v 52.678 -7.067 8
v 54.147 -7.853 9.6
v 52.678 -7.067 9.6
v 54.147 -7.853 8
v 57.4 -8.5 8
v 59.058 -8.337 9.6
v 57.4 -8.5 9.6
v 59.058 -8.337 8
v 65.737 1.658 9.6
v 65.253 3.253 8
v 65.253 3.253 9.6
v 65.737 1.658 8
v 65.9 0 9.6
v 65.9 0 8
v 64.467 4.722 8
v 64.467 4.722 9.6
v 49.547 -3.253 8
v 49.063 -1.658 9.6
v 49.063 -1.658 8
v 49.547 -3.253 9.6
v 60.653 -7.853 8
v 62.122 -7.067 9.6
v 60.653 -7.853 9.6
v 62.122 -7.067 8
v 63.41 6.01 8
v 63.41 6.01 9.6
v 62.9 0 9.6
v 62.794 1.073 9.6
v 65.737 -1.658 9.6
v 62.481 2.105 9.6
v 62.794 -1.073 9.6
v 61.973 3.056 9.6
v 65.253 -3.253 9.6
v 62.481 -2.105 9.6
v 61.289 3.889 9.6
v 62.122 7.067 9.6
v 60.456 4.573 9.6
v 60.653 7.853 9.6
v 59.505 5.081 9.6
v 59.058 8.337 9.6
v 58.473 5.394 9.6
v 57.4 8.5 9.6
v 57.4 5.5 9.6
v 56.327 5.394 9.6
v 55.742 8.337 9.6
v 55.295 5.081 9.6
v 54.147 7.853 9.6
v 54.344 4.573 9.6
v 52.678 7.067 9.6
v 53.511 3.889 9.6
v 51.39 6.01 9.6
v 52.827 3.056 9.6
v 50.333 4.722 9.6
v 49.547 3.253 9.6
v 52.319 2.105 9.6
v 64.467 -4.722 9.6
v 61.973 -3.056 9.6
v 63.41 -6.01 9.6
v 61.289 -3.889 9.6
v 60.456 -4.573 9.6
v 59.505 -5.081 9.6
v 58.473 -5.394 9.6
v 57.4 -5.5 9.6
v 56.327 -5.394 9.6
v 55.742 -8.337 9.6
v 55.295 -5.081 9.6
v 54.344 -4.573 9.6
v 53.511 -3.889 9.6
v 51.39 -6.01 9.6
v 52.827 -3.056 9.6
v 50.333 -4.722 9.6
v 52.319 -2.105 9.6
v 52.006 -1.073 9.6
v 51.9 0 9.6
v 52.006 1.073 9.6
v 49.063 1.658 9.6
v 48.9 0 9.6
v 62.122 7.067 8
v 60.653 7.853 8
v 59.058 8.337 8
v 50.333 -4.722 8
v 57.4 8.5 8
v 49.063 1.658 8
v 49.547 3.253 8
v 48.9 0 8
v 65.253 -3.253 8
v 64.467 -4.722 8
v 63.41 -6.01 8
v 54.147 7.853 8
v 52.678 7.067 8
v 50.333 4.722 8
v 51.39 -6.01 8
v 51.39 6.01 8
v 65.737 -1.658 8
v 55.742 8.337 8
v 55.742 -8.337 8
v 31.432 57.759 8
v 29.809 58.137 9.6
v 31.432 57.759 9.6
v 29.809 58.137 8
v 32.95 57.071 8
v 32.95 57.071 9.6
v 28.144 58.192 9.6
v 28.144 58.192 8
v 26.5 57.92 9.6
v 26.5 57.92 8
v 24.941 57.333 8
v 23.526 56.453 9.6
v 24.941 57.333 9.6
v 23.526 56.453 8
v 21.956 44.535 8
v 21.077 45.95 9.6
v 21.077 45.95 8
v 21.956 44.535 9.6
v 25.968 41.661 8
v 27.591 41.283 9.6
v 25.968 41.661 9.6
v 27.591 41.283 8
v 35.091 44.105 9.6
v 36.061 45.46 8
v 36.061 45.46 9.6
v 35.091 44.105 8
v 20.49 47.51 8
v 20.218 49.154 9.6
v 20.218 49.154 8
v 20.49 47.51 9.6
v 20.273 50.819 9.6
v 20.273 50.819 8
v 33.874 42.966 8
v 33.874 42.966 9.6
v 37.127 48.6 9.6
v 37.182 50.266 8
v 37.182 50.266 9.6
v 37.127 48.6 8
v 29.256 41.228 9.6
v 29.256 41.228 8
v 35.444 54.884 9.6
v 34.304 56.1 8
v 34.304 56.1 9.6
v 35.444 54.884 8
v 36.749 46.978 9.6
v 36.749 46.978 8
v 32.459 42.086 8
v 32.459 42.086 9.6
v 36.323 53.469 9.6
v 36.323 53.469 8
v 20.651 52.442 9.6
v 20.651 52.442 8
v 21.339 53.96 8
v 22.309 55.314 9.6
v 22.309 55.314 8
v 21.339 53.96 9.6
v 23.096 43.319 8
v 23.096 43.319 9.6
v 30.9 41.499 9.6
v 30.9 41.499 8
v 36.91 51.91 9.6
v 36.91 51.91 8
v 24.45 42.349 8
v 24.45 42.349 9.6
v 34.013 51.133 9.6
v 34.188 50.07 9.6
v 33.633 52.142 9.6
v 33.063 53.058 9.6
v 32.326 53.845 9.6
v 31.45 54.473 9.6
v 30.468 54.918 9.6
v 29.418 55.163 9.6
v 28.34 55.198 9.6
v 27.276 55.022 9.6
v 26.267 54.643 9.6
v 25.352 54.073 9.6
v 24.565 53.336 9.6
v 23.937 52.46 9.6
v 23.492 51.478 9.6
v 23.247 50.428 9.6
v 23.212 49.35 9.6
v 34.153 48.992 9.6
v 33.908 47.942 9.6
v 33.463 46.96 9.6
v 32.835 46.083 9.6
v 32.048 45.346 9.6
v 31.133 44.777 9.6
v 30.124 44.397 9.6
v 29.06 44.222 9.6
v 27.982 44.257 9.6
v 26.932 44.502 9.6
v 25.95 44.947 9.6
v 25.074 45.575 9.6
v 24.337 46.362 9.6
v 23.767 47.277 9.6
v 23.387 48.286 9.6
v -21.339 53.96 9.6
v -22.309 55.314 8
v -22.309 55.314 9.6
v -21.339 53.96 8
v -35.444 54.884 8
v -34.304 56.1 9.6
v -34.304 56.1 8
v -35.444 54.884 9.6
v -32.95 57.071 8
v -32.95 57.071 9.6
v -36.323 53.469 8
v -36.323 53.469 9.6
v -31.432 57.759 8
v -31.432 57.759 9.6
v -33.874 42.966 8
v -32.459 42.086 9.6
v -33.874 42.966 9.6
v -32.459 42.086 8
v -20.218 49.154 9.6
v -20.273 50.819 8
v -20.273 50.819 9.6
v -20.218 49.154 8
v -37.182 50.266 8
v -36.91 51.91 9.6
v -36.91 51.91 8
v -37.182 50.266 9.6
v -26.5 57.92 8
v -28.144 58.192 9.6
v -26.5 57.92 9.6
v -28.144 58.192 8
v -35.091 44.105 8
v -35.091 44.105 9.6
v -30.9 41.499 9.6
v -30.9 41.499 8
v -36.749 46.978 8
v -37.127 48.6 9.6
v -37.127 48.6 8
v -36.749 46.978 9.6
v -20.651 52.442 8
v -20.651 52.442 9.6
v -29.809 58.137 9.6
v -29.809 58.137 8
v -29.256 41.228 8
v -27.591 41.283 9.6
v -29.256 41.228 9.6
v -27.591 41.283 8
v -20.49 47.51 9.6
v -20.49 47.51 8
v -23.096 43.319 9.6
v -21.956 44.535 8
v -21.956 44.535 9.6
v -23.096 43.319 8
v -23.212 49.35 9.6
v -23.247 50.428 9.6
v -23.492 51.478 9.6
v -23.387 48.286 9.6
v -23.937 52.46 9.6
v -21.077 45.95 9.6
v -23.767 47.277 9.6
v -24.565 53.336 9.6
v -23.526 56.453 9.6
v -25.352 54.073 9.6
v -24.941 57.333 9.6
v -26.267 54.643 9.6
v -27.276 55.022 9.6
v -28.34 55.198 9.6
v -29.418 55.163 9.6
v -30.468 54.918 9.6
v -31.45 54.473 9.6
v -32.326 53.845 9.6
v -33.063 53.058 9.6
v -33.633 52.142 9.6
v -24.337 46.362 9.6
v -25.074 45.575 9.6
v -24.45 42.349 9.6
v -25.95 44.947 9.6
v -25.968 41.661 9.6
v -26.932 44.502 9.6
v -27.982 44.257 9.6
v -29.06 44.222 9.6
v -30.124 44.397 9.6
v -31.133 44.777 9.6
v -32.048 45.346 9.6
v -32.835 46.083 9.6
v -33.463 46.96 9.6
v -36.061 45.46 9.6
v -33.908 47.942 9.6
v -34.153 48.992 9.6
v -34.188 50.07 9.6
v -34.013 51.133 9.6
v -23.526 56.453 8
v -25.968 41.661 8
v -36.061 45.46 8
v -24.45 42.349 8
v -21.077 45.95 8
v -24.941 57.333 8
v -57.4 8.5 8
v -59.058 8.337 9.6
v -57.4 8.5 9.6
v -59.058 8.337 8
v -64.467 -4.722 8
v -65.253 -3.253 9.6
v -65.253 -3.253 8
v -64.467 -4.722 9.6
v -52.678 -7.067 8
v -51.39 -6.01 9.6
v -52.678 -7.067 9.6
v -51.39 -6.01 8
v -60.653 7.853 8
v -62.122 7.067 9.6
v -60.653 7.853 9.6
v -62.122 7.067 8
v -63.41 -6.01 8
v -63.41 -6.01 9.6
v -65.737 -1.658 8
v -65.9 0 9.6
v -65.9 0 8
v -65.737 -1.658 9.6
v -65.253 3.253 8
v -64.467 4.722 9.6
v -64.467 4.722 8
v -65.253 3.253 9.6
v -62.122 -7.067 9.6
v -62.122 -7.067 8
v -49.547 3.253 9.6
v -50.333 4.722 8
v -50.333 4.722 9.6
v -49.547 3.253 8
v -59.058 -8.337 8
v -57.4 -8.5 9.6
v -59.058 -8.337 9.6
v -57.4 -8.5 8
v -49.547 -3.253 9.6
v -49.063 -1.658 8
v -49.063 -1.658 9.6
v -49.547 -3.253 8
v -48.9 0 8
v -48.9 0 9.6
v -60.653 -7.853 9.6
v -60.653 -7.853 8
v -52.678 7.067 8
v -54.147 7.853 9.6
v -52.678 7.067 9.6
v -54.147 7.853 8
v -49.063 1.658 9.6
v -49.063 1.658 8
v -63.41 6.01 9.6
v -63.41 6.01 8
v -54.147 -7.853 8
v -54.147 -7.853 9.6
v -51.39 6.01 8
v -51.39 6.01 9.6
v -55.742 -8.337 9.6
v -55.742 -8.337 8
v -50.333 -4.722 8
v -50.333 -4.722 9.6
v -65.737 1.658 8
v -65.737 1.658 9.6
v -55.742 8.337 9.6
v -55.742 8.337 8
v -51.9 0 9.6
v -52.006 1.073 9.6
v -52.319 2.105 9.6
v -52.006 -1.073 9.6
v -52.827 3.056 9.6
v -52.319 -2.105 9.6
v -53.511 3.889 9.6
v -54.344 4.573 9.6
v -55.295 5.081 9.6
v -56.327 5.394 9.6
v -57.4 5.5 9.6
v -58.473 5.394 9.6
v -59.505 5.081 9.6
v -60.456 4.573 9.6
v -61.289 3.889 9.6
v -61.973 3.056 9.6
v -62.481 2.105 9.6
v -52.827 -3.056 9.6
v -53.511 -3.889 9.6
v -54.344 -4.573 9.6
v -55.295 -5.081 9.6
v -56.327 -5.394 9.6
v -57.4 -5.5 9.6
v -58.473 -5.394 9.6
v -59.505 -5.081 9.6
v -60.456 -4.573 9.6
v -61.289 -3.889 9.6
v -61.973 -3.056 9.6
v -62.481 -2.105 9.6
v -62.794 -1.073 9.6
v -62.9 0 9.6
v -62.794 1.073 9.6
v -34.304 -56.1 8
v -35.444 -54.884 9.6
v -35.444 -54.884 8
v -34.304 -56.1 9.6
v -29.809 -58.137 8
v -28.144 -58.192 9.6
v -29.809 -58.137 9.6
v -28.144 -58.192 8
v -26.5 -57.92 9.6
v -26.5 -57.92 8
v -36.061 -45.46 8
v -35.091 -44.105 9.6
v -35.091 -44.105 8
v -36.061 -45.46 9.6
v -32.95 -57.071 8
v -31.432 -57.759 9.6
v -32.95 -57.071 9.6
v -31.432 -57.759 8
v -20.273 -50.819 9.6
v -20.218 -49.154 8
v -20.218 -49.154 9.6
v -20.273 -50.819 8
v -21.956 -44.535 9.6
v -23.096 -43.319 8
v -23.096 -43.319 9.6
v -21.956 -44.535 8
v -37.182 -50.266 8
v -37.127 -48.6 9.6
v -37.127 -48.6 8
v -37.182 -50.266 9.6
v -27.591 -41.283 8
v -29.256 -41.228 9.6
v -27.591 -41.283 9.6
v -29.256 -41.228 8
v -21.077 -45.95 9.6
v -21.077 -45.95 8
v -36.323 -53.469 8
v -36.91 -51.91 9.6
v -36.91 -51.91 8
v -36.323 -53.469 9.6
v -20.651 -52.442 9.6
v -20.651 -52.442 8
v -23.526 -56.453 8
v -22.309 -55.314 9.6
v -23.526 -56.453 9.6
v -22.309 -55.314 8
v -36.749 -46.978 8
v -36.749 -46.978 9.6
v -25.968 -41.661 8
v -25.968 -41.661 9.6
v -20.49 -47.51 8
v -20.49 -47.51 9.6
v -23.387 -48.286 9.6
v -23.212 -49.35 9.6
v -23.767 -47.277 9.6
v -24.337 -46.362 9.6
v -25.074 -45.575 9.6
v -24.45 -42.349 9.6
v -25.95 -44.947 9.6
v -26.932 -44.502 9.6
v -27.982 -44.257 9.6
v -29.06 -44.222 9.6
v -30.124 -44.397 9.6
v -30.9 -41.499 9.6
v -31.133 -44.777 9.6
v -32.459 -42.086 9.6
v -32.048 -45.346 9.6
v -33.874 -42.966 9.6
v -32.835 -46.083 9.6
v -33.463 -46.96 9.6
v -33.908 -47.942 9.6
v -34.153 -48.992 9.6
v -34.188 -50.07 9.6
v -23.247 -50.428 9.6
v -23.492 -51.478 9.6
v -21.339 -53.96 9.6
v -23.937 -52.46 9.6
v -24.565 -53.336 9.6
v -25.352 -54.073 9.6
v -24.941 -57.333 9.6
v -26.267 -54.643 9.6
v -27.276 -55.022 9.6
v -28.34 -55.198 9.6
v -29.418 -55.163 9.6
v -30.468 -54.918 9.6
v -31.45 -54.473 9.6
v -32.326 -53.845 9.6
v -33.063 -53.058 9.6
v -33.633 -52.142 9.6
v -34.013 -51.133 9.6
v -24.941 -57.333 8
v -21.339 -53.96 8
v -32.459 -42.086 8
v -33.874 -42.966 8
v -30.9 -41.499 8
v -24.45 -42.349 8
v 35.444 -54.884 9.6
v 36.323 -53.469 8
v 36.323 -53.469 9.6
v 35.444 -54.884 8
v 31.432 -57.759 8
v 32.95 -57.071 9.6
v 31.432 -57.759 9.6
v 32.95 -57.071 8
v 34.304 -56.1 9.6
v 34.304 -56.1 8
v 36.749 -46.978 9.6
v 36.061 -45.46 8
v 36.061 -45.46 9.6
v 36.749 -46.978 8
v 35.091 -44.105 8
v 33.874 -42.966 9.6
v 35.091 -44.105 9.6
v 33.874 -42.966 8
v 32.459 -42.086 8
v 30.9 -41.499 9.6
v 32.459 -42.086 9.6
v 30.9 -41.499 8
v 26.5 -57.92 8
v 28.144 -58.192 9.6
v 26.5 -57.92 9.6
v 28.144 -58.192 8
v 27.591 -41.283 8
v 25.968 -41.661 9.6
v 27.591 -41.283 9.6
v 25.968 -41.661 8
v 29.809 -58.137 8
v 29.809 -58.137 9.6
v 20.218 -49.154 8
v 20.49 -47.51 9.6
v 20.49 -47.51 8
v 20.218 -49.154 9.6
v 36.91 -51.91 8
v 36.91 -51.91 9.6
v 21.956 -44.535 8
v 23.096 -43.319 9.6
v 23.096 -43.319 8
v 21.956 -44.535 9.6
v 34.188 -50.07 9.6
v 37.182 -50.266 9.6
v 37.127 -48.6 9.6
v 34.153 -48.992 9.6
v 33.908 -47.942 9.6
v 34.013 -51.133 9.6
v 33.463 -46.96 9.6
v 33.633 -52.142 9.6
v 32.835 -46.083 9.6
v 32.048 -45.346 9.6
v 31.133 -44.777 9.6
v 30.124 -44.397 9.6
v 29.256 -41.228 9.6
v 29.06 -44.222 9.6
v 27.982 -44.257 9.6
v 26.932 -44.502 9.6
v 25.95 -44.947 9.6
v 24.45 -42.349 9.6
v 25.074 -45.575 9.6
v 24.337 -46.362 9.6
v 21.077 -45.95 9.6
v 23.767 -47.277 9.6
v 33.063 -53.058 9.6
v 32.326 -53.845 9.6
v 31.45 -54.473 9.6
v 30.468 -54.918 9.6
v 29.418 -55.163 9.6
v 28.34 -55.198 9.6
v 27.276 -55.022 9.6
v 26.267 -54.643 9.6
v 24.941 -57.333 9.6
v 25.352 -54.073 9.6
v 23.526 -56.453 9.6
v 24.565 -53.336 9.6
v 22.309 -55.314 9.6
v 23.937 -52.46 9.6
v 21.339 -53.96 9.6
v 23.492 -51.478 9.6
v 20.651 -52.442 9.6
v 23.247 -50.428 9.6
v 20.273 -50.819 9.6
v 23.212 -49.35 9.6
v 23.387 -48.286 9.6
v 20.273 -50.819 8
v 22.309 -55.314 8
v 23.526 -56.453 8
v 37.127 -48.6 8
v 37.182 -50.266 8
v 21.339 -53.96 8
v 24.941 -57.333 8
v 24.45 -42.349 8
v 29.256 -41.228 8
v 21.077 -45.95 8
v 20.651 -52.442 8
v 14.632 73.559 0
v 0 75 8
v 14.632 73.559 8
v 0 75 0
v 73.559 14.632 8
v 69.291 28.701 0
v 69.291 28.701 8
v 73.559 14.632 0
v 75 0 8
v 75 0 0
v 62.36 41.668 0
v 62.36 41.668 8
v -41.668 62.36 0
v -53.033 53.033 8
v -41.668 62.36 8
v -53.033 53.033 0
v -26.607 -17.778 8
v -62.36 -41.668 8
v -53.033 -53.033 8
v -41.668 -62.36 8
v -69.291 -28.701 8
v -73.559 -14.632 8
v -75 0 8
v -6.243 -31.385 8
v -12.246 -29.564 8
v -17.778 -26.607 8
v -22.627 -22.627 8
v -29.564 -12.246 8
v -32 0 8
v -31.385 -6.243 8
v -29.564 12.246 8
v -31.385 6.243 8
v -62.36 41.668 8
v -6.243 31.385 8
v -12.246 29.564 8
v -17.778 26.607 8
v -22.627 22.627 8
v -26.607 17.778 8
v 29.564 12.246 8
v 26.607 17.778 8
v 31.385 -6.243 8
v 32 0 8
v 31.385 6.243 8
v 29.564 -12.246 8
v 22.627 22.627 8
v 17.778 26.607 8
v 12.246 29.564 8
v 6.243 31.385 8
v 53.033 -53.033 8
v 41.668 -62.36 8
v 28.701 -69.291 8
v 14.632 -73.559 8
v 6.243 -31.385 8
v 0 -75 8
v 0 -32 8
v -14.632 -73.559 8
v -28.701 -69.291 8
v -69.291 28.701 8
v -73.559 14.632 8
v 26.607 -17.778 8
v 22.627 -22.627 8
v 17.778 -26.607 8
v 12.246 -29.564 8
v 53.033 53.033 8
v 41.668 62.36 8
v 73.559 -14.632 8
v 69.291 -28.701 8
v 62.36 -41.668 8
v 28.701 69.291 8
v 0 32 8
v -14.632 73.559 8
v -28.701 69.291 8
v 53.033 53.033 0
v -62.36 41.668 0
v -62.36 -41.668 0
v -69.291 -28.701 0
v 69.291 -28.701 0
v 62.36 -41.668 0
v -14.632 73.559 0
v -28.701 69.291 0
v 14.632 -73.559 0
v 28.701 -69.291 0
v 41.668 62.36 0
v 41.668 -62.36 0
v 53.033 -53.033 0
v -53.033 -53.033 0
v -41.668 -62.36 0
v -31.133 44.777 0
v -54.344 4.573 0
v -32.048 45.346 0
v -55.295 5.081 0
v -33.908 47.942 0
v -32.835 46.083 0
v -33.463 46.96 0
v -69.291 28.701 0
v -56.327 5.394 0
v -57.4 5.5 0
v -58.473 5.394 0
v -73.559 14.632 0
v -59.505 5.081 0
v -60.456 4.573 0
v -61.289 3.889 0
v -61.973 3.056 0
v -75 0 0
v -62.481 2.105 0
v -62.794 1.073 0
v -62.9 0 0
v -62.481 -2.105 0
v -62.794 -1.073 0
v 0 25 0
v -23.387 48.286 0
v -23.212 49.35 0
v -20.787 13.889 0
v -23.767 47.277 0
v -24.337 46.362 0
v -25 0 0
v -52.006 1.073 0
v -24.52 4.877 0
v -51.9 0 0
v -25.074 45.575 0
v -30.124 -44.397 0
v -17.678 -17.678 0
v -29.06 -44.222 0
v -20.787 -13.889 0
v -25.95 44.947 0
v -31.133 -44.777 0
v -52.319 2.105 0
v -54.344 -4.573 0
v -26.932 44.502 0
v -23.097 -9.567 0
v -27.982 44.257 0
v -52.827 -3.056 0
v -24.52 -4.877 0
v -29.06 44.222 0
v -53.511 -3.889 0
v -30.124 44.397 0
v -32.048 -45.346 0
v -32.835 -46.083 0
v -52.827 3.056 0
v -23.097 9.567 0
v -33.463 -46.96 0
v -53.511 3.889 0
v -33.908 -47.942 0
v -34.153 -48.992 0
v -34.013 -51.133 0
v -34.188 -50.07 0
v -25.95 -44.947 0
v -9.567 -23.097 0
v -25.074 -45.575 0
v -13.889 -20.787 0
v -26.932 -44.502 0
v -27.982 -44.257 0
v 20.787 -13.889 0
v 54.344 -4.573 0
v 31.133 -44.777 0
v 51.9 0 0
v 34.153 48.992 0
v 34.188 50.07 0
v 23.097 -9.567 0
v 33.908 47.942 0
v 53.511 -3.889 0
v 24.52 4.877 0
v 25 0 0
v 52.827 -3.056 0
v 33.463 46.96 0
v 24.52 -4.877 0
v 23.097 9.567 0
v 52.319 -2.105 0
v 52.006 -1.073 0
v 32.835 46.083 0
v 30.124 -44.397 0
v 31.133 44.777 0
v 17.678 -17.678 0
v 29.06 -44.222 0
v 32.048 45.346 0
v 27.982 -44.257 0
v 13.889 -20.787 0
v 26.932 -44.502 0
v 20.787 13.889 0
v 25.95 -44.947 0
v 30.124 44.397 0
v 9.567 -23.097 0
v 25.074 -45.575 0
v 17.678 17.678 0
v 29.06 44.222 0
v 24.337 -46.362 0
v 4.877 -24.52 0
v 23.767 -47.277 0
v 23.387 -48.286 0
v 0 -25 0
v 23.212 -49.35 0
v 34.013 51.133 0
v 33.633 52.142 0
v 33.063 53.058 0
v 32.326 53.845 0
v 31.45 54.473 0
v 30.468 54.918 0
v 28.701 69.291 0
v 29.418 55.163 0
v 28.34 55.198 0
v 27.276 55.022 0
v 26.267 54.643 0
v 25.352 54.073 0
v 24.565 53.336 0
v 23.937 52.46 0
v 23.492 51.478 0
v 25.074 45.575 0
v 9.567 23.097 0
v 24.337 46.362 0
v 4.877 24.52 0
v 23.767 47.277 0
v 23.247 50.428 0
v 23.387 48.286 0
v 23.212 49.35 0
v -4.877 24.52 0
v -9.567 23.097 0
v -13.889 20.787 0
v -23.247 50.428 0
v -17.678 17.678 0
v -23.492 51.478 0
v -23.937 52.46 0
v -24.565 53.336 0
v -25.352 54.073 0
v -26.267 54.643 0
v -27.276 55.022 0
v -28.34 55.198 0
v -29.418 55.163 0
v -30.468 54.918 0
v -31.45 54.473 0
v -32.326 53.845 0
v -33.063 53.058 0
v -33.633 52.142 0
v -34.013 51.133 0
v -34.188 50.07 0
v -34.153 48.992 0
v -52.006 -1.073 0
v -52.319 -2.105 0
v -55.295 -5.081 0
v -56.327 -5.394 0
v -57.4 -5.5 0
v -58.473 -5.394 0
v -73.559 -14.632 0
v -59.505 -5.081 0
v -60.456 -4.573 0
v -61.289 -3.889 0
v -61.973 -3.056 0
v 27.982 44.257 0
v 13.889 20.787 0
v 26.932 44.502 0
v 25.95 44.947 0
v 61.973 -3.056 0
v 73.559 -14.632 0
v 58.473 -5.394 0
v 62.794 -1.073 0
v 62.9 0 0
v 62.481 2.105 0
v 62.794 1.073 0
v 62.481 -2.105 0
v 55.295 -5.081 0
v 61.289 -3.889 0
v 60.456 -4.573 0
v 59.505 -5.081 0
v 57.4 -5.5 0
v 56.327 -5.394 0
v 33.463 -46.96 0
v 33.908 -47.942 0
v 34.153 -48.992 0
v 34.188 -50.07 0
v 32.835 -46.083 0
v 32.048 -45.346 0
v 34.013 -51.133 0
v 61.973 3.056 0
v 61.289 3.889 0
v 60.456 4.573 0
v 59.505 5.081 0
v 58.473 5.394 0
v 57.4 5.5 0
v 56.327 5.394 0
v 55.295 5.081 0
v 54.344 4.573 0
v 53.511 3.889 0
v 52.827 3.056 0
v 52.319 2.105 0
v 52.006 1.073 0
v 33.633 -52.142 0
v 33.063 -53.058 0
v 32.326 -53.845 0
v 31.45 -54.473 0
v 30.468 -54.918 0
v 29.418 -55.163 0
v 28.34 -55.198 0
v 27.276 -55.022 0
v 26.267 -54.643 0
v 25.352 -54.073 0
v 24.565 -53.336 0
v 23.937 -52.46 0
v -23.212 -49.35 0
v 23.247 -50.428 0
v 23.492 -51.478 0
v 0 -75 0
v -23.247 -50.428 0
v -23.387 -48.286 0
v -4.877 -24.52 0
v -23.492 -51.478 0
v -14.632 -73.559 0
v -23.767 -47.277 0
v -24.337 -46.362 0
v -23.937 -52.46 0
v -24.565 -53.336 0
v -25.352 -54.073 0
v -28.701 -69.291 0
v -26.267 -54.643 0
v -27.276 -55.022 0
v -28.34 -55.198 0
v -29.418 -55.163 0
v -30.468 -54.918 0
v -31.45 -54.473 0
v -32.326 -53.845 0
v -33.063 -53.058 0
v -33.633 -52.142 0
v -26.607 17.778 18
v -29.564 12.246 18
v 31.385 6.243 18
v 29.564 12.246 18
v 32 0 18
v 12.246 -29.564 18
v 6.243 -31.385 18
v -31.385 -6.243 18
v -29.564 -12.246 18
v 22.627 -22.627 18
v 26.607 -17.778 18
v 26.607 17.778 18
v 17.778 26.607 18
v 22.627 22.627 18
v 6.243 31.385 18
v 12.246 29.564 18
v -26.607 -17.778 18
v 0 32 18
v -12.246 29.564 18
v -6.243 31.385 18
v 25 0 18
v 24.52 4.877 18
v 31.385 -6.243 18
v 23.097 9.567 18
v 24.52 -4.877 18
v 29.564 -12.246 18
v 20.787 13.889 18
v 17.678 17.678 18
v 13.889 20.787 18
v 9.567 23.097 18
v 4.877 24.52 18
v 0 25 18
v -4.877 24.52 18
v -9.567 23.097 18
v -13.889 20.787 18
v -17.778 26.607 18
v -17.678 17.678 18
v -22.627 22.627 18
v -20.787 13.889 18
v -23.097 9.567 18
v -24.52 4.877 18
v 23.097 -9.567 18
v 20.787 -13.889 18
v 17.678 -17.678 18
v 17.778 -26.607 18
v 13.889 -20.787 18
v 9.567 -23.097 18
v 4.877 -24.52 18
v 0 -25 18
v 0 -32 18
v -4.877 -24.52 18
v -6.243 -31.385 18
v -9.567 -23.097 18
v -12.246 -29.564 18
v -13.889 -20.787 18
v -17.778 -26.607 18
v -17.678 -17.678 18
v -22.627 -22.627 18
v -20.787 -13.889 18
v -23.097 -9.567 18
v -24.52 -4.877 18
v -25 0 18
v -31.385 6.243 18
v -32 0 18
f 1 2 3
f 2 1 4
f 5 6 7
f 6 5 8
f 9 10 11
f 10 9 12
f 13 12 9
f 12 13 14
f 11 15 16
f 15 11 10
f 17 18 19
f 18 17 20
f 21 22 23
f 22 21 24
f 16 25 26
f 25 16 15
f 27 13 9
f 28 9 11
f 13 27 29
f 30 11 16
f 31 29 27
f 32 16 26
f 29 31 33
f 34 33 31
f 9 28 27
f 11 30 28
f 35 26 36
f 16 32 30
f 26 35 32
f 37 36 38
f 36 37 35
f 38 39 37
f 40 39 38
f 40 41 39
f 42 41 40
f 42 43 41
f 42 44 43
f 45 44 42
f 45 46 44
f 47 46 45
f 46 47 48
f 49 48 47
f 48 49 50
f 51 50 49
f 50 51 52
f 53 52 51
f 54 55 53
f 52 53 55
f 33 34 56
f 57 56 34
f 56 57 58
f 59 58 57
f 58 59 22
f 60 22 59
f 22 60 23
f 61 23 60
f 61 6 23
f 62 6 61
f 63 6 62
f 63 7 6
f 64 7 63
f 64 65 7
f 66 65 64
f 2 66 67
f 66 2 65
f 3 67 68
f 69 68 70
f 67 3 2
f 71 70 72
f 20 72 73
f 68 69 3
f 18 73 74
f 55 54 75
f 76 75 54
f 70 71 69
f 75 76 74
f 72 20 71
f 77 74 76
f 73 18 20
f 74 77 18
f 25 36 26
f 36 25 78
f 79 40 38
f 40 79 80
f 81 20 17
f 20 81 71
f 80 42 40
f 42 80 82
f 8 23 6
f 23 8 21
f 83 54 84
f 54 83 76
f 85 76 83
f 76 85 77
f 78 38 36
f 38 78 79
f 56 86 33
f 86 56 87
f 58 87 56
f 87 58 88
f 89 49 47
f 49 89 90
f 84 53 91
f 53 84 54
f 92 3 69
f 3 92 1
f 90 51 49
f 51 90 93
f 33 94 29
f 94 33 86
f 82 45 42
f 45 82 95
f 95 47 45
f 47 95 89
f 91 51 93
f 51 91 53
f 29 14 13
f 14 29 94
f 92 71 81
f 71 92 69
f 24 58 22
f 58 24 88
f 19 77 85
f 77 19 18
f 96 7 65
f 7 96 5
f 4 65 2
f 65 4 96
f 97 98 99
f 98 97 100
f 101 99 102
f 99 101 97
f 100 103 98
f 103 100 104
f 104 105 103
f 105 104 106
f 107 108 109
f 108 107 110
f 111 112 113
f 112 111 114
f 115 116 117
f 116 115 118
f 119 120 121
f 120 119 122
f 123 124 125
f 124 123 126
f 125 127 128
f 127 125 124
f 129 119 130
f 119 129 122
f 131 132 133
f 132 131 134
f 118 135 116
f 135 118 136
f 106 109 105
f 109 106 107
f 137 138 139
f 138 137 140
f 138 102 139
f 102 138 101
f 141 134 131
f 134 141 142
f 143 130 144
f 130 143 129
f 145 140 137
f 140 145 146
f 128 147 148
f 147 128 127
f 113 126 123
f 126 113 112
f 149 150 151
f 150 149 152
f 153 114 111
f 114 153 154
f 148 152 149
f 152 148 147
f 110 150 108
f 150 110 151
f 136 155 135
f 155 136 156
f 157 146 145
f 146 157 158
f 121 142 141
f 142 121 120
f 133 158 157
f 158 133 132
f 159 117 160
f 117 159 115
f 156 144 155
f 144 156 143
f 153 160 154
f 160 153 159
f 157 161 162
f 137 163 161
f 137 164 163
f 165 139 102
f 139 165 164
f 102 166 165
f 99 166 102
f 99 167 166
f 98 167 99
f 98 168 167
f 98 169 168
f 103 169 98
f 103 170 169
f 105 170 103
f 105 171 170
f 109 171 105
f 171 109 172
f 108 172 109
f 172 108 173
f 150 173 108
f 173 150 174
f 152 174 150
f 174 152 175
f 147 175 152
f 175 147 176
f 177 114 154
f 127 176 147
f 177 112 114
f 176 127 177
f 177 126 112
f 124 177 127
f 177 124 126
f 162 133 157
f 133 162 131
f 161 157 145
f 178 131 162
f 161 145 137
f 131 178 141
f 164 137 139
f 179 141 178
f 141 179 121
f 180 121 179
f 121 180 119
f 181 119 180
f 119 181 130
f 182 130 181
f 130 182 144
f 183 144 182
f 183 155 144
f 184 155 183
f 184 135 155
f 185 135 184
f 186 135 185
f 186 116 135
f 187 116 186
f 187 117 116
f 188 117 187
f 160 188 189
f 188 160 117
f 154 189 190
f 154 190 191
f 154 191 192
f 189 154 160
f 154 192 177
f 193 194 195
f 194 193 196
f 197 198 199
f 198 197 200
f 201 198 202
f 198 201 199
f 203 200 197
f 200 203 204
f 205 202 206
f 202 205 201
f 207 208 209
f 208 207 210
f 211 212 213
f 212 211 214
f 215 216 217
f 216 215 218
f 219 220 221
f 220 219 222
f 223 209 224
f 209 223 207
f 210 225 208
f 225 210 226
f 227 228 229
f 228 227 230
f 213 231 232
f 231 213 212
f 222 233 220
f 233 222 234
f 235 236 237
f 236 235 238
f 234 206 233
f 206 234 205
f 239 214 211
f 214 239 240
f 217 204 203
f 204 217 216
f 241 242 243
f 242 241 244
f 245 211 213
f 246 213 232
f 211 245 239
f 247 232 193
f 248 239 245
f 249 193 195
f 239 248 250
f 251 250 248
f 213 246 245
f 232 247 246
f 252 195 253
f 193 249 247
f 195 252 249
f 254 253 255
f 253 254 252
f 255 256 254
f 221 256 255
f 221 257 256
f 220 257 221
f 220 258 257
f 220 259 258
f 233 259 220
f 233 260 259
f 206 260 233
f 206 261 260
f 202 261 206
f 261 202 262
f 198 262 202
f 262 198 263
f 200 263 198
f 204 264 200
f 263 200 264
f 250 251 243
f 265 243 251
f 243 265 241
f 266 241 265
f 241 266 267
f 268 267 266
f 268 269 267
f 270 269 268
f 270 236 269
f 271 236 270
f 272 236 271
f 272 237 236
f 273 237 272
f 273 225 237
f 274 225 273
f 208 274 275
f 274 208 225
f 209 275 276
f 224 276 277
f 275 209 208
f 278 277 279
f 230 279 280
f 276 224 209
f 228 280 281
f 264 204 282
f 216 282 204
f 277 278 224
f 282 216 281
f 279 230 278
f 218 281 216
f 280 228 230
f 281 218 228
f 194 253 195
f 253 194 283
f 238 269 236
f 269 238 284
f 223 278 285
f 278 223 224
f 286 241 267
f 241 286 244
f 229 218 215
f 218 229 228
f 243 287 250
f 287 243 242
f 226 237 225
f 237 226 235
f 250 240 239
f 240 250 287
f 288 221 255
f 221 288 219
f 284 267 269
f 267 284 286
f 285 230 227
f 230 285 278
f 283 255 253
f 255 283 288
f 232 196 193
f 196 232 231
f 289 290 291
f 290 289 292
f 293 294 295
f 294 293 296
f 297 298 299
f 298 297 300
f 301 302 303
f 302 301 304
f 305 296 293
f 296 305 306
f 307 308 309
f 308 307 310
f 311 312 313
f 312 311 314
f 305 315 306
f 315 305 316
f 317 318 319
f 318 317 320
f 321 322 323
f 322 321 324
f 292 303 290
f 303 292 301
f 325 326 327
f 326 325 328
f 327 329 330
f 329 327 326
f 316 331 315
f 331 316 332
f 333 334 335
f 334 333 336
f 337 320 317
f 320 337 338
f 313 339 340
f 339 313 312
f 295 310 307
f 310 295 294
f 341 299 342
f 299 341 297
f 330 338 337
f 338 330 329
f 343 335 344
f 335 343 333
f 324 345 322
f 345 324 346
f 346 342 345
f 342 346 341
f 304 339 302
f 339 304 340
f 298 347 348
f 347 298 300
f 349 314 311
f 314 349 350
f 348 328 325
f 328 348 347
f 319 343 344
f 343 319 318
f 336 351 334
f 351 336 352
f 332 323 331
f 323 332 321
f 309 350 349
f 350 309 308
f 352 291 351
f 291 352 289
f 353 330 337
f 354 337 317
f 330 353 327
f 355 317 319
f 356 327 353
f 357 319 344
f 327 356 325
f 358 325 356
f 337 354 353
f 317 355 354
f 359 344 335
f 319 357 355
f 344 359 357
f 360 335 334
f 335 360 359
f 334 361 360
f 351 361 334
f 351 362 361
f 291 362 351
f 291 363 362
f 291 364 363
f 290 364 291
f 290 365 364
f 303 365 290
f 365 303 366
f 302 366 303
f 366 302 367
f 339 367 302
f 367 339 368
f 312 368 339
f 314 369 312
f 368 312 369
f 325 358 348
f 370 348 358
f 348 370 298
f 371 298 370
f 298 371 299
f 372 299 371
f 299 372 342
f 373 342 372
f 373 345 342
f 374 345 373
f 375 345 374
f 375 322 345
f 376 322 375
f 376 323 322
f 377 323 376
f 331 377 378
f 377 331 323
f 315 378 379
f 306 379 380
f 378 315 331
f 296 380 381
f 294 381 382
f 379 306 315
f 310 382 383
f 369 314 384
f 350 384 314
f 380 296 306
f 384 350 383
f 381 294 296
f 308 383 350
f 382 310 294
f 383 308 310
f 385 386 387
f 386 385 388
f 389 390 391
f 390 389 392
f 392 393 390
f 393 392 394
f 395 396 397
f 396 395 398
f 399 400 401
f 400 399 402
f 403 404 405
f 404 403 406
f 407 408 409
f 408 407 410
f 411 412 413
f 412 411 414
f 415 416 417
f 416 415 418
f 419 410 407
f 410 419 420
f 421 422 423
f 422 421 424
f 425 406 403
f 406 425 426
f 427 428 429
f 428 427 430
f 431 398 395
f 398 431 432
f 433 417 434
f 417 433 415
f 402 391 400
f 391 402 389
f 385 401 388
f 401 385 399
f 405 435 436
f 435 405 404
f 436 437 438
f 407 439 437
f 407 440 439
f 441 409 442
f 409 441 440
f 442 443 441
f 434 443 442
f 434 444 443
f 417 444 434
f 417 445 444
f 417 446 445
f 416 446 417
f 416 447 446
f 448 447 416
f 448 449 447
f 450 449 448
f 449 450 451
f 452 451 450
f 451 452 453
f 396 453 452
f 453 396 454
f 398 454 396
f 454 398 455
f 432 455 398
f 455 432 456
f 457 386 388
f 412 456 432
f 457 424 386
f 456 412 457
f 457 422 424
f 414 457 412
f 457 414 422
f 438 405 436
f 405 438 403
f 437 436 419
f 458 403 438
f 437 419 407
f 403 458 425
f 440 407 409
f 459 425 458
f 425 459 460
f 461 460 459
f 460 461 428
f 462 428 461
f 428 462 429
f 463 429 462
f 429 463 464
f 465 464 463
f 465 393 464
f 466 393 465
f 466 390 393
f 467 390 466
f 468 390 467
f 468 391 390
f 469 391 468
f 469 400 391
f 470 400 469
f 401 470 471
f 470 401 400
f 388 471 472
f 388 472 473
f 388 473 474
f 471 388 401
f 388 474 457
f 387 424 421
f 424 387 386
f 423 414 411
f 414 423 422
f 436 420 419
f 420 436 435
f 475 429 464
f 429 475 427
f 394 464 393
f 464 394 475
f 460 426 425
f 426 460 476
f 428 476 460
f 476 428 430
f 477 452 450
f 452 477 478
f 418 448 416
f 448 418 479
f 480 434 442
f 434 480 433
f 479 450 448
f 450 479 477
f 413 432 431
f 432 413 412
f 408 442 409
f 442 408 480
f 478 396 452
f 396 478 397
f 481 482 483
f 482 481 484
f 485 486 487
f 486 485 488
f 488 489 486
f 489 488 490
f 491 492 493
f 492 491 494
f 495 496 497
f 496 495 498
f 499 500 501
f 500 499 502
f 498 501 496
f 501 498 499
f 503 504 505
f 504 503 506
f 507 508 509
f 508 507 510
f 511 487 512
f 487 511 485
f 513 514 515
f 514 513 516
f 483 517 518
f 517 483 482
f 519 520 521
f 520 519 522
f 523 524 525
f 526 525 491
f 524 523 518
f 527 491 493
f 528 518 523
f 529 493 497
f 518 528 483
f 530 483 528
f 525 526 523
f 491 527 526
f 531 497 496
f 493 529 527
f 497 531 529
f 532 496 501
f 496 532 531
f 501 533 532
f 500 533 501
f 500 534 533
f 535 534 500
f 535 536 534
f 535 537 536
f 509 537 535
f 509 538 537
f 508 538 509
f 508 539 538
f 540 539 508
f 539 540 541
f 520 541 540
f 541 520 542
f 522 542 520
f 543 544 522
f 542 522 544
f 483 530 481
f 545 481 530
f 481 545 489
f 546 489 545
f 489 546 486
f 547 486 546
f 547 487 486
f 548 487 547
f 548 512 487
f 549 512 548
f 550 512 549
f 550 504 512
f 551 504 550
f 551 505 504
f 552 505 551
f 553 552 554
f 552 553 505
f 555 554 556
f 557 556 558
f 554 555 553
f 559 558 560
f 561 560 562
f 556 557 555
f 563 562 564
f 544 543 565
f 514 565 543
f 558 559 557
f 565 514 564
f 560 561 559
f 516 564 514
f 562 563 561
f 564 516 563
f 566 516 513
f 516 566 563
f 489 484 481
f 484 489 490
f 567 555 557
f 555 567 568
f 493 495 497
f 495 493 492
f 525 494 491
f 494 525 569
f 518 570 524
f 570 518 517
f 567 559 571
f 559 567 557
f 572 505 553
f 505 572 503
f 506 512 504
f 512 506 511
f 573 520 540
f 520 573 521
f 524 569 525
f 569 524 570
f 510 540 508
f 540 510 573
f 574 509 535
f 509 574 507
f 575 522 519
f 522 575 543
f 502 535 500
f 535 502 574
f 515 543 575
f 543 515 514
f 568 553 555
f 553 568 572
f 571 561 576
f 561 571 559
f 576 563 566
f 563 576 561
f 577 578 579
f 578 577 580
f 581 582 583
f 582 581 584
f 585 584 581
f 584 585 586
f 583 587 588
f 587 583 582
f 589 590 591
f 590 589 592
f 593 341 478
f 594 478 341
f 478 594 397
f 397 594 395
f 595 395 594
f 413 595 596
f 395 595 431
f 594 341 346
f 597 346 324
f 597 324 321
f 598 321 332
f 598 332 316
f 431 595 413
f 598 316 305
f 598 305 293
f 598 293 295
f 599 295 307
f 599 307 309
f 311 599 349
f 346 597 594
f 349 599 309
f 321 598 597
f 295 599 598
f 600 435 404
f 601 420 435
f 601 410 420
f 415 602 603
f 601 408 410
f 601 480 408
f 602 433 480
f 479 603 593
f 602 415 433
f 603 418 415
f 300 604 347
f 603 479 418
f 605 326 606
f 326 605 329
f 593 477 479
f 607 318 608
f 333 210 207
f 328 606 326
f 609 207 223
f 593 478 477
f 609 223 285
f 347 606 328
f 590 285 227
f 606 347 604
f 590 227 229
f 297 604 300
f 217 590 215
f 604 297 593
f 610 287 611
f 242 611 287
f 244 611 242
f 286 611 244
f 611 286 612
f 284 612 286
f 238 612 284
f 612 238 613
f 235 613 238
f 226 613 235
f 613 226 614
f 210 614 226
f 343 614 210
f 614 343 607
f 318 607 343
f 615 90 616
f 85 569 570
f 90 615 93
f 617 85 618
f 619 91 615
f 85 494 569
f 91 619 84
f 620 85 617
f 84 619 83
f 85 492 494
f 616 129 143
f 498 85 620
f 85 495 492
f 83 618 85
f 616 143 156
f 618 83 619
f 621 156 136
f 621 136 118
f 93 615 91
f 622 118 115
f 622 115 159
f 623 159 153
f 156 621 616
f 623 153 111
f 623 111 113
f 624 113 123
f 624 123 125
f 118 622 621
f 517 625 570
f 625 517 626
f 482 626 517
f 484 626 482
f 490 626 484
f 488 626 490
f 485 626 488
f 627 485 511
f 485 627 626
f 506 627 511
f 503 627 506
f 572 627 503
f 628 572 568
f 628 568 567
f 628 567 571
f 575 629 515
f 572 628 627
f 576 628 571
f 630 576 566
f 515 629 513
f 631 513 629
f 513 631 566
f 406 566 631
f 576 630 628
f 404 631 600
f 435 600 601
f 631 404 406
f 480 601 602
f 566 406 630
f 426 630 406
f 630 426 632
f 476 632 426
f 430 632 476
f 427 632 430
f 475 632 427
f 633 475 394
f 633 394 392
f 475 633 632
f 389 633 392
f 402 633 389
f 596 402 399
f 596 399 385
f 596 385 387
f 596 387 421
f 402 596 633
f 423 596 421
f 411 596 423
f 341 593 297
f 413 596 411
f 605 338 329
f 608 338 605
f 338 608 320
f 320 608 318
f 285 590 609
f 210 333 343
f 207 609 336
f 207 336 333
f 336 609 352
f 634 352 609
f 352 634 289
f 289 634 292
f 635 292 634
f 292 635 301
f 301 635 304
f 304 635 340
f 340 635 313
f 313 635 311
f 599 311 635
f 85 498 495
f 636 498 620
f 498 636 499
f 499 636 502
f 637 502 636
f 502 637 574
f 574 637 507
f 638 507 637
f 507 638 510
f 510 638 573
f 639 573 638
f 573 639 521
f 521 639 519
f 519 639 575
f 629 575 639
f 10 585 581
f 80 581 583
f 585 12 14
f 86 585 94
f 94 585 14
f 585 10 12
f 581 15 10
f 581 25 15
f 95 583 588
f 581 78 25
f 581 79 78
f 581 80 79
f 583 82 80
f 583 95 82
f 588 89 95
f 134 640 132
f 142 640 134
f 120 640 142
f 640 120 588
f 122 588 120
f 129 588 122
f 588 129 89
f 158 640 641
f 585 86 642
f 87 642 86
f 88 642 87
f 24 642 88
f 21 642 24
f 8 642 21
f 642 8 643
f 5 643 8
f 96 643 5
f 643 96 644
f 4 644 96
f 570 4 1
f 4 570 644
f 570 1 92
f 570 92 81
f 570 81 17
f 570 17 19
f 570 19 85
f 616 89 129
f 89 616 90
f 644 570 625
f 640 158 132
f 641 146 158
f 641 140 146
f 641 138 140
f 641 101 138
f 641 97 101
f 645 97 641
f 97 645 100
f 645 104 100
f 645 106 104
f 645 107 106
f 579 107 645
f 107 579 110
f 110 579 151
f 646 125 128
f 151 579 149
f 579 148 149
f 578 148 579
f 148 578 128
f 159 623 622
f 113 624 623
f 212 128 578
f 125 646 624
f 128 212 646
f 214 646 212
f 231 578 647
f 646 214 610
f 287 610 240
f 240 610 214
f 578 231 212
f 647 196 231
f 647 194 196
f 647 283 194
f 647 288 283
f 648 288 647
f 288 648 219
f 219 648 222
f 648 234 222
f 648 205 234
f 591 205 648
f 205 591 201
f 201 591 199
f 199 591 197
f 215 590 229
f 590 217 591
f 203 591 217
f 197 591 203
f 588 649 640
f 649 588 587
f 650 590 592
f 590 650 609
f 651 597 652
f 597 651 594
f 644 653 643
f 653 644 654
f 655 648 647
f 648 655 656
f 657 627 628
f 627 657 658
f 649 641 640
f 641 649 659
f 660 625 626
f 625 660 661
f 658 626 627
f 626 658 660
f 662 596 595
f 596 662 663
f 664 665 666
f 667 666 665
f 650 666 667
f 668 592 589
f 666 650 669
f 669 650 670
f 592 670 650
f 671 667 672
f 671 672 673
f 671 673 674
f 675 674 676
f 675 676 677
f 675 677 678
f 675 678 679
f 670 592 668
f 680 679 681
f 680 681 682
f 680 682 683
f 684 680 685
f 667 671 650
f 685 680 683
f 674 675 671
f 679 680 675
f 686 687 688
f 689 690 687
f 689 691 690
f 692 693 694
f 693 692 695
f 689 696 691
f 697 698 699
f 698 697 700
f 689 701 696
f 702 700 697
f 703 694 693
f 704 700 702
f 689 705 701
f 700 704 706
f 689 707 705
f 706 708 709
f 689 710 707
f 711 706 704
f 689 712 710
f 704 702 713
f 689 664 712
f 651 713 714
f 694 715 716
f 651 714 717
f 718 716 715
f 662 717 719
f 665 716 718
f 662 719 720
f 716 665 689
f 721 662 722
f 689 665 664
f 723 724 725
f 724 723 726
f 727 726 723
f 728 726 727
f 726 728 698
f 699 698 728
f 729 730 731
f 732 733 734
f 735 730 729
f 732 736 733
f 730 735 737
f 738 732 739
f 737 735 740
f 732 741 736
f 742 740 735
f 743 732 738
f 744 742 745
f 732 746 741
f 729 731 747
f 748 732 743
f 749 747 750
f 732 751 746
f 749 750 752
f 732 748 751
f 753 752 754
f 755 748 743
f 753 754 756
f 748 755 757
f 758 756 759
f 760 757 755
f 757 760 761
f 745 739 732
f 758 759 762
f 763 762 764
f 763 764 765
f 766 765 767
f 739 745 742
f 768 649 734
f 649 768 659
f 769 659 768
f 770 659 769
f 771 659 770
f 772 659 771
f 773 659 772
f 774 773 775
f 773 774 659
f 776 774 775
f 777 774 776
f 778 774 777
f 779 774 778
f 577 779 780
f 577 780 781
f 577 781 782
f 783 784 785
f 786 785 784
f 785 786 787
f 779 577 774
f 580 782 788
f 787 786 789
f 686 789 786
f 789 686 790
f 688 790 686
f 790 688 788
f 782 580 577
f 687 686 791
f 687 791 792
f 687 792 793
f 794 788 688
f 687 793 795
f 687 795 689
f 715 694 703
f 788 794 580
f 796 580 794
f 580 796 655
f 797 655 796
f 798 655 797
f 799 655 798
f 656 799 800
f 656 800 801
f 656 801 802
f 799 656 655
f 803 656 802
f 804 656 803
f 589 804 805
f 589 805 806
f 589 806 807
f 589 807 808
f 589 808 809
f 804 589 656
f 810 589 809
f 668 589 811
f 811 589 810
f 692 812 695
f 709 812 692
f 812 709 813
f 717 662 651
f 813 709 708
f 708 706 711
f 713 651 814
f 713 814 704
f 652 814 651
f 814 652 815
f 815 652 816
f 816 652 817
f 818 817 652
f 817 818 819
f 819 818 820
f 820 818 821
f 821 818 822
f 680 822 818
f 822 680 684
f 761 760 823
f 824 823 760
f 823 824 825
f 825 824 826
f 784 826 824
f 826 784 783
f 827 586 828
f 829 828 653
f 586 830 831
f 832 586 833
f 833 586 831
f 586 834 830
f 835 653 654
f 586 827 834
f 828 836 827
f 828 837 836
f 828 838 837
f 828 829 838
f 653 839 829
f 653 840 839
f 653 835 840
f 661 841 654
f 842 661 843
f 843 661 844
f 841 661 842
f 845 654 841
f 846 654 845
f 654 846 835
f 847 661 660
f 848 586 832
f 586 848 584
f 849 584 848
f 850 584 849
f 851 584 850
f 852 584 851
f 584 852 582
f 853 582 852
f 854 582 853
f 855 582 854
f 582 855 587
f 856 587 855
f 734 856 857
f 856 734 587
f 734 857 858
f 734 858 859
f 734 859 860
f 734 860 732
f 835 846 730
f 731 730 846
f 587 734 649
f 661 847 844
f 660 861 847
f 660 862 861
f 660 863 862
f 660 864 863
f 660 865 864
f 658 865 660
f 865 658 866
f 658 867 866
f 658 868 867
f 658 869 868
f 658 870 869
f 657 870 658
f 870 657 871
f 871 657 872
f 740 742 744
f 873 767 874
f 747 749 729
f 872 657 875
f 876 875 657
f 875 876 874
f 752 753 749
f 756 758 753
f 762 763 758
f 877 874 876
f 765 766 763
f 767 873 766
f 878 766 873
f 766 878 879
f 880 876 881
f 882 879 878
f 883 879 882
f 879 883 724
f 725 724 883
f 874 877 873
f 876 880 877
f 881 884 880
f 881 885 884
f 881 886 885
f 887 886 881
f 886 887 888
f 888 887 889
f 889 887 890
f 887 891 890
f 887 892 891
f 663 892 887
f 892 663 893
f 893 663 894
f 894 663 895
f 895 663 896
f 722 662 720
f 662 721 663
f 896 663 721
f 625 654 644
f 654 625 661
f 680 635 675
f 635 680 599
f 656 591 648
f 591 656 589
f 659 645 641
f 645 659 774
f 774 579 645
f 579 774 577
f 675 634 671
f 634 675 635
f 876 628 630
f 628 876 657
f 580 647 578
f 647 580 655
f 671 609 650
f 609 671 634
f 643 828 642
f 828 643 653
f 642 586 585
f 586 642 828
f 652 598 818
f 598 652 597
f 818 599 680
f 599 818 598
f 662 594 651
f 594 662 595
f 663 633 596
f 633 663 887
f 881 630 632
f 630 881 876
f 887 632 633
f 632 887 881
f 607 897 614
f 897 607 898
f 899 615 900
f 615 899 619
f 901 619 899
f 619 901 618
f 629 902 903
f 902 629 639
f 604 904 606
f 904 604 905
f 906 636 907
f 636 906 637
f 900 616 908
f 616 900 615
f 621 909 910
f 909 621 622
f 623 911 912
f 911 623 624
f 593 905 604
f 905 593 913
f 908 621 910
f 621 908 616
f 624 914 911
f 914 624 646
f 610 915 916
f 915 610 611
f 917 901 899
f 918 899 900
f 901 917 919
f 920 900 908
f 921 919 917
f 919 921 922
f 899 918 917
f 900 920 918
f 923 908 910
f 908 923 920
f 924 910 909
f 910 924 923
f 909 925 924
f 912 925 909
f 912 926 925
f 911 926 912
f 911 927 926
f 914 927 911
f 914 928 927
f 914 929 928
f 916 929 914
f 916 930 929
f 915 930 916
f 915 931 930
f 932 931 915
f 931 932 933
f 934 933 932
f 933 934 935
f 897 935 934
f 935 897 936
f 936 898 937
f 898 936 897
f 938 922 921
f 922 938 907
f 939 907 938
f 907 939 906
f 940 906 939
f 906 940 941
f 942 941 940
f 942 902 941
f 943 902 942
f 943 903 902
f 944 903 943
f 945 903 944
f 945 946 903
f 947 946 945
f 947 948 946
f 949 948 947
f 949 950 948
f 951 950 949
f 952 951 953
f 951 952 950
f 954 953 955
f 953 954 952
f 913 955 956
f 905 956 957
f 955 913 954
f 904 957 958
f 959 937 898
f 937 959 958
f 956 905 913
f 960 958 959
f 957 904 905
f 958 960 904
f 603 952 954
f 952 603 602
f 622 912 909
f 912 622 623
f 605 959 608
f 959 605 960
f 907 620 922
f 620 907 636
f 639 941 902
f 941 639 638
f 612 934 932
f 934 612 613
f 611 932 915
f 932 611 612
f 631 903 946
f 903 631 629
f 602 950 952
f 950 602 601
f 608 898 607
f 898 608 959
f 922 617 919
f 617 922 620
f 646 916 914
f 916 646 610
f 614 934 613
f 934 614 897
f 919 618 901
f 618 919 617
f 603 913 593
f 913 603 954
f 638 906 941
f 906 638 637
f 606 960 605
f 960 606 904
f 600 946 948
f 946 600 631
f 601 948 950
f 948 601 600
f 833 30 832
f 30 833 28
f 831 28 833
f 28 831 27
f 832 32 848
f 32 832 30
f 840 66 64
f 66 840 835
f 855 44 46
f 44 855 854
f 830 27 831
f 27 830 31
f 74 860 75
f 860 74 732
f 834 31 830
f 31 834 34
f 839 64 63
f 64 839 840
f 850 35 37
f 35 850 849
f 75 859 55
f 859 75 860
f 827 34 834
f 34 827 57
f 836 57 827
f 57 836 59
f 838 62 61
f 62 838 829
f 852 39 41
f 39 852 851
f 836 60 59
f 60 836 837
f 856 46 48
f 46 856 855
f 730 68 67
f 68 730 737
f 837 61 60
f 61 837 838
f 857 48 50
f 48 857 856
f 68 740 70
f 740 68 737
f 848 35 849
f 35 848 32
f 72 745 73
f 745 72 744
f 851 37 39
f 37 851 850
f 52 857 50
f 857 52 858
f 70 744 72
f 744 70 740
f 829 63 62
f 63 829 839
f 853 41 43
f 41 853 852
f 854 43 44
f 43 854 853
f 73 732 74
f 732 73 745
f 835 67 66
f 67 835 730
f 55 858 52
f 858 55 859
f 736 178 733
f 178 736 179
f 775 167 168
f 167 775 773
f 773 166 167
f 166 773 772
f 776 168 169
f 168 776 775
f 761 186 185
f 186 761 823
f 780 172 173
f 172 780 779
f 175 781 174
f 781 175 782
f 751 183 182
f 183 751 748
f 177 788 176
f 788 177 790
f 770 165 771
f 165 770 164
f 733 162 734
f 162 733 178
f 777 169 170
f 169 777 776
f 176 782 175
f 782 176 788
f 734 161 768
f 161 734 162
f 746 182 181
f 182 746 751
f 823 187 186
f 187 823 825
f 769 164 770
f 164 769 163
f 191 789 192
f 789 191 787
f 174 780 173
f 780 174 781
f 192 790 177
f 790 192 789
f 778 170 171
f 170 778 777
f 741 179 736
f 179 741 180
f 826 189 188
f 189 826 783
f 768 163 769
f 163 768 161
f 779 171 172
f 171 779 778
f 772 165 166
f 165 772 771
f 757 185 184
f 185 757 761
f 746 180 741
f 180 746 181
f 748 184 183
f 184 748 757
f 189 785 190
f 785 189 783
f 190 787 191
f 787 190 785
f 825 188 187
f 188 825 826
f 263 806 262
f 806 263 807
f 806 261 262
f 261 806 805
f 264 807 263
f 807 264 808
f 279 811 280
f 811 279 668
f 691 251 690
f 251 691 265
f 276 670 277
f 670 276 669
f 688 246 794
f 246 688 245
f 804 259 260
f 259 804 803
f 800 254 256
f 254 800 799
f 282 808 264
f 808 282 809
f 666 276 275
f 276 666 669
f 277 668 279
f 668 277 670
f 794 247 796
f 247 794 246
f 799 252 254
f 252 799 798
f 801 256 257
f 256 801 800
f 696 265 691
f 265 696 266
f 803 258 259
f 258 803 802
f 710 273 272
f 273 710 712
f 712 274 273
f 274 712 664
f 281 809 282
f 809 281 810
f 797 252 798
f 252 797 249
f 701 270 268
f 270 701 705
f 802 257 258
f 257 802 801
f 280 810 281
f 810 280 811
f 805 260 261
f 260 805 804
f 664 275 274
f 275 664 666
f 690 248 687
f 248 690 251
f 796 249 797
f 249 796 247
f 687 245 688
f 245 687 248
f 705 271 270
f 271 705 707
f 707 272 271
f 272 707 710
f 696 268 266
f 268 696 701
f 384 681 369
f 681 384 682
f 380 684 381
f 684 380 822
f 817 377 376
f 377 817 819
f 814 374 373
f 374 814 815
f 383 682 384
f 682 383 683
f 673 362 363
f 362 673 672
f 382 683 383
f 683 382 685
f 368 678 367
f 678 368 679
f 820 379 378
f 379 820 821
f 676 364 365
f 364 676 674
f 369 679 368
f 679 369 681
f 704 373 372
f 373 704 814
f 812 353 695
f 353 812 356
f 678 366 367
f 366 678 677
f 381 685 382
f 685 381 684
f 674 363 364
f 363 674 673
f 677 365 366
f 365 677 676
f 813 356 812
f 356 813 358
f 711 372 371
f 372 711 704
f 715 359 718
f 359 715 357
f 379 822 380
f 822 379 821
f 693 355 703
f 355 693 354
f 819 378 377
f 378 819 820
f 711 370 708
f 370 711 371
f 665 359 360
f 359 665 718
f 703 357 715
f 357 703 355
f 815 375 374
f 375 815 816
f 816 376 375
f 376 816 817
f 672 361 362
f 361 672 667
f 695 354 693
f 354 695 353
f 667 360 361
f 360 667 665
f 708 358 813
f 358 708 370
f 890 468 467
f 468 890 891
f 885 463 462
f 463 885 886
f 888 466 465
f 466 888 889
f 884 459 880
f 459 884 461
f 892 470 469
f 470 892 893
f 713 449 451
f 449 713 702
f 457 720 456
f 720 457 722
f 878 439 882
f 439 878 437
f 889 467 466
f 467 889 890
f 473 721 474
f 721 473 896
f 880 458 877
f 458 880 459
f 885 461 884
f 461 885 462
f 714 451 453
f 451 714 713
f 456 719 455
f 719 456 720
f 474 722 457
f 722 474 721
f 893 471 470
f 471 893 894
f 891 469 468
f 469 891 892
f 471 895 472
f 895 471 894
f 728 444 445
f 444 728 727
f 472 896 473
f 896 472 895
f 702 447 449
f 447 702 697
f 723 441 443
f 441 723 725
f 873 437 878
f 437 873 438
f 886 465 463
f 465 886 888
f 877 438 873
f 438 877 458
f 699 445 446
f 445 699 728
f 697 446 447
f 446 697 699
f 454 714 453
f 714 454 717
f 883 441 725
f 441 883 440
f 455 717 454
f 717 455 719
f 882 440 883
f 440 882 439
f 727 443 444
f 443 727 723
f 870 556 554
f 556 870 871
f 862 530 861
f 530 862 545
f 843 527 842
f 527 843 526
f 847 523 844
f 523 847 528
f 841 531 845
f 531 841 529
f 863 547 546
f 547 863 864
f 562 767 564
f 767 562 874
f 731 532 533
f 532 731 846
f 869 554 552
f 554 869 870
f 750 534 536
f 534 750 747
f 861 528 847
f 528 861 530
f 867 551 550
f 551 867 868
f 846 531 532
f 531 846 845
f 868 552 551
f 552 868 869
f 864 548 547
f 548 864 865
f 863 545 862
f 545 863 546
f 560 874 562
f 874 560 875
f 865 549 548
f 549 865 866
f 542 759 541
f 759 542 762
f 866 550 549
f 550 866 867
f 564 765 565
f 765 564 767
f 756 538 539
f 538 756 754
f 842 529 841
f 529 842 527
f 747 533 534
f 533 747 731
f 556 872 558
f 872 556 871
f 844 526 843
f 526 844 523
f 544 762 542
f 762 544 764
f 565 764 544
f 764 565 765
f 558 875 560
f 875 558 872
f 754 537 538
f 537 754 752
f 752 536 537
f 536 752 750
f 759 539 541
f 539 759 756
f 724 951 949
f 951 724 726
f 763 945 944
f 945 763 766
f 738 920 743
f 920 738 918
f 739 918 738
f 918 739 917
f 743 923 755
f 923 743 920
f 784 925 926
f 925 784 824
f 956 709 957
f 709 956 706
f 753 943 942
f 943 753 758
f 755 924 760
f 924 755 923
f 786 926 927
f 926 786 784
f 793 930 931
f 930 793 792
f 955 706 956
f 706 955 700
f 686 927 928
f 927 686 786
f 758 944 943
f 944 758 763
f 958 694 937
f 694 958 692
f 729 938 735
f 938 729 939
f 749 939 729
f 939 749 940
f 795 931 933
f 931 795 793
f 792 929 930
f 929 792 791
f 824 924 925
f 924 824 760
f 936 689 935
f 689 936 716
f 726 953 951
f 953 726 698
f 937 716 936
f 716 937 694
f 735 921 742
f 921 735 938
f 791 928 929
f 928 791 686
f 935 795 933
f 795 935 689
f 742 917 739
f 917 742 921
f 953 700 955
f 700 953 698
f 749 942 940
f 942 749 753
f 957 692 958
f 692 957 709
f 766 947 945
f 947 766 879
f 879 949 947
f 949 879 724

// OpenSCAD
$fn = 32;

// ----------------------------------------------------------------------
// Bolt-circle flange: 150 mm outside, 6 bolt holes, bore 50 mm
// ----------------------------------------------------------------------

// --- parameters (mm) ---
flange_d = 150;           // flange outside diameter
flange_t = 8;             // flange thickness
bolts = 6;                // number of bolt holes
bolt_d = 11;              // bolt clearance
bolt_r = 57.4;            // bolt circle radius
bore_d = 50;              // centre bore
hub_d = 64;               // raised hub diameter
hub_h = 10;               // raised hub height
spot_d = 17;              // spot faced bosses
spot_h = 1.6;             // spot face height

module body() {
  cylinder(h = flange_t, d = flange_d);
  /* raised hub, sunk 1 mm into the flange */
  translate([0, 0, flange_t - 1]) cylinder(h = hub_h + 1, d = hub_d);
  /* spot faced pads under the bolt heads */
  for (i = [0 : bolts - 1]) rotate([0, 0, i * 360 / bolts]) translate([bolt_r, 0, flange_t - 1]) cylinder(h = spot_h + 1, d = spot_d);
}

difference() {
  body();
  /* bolt circle */
  for (i = [0 : bolts - 1]) rotate([0, 0, i * 360 / bolts]) translate([bolt_r, 0, -1]) cylinder(h = flange_t + hub_h + 3, d = bolt_d);
  translate([0, 0, -1]) cylinder(h = flange_t + hub_h + 3, d = bore_d);
}
